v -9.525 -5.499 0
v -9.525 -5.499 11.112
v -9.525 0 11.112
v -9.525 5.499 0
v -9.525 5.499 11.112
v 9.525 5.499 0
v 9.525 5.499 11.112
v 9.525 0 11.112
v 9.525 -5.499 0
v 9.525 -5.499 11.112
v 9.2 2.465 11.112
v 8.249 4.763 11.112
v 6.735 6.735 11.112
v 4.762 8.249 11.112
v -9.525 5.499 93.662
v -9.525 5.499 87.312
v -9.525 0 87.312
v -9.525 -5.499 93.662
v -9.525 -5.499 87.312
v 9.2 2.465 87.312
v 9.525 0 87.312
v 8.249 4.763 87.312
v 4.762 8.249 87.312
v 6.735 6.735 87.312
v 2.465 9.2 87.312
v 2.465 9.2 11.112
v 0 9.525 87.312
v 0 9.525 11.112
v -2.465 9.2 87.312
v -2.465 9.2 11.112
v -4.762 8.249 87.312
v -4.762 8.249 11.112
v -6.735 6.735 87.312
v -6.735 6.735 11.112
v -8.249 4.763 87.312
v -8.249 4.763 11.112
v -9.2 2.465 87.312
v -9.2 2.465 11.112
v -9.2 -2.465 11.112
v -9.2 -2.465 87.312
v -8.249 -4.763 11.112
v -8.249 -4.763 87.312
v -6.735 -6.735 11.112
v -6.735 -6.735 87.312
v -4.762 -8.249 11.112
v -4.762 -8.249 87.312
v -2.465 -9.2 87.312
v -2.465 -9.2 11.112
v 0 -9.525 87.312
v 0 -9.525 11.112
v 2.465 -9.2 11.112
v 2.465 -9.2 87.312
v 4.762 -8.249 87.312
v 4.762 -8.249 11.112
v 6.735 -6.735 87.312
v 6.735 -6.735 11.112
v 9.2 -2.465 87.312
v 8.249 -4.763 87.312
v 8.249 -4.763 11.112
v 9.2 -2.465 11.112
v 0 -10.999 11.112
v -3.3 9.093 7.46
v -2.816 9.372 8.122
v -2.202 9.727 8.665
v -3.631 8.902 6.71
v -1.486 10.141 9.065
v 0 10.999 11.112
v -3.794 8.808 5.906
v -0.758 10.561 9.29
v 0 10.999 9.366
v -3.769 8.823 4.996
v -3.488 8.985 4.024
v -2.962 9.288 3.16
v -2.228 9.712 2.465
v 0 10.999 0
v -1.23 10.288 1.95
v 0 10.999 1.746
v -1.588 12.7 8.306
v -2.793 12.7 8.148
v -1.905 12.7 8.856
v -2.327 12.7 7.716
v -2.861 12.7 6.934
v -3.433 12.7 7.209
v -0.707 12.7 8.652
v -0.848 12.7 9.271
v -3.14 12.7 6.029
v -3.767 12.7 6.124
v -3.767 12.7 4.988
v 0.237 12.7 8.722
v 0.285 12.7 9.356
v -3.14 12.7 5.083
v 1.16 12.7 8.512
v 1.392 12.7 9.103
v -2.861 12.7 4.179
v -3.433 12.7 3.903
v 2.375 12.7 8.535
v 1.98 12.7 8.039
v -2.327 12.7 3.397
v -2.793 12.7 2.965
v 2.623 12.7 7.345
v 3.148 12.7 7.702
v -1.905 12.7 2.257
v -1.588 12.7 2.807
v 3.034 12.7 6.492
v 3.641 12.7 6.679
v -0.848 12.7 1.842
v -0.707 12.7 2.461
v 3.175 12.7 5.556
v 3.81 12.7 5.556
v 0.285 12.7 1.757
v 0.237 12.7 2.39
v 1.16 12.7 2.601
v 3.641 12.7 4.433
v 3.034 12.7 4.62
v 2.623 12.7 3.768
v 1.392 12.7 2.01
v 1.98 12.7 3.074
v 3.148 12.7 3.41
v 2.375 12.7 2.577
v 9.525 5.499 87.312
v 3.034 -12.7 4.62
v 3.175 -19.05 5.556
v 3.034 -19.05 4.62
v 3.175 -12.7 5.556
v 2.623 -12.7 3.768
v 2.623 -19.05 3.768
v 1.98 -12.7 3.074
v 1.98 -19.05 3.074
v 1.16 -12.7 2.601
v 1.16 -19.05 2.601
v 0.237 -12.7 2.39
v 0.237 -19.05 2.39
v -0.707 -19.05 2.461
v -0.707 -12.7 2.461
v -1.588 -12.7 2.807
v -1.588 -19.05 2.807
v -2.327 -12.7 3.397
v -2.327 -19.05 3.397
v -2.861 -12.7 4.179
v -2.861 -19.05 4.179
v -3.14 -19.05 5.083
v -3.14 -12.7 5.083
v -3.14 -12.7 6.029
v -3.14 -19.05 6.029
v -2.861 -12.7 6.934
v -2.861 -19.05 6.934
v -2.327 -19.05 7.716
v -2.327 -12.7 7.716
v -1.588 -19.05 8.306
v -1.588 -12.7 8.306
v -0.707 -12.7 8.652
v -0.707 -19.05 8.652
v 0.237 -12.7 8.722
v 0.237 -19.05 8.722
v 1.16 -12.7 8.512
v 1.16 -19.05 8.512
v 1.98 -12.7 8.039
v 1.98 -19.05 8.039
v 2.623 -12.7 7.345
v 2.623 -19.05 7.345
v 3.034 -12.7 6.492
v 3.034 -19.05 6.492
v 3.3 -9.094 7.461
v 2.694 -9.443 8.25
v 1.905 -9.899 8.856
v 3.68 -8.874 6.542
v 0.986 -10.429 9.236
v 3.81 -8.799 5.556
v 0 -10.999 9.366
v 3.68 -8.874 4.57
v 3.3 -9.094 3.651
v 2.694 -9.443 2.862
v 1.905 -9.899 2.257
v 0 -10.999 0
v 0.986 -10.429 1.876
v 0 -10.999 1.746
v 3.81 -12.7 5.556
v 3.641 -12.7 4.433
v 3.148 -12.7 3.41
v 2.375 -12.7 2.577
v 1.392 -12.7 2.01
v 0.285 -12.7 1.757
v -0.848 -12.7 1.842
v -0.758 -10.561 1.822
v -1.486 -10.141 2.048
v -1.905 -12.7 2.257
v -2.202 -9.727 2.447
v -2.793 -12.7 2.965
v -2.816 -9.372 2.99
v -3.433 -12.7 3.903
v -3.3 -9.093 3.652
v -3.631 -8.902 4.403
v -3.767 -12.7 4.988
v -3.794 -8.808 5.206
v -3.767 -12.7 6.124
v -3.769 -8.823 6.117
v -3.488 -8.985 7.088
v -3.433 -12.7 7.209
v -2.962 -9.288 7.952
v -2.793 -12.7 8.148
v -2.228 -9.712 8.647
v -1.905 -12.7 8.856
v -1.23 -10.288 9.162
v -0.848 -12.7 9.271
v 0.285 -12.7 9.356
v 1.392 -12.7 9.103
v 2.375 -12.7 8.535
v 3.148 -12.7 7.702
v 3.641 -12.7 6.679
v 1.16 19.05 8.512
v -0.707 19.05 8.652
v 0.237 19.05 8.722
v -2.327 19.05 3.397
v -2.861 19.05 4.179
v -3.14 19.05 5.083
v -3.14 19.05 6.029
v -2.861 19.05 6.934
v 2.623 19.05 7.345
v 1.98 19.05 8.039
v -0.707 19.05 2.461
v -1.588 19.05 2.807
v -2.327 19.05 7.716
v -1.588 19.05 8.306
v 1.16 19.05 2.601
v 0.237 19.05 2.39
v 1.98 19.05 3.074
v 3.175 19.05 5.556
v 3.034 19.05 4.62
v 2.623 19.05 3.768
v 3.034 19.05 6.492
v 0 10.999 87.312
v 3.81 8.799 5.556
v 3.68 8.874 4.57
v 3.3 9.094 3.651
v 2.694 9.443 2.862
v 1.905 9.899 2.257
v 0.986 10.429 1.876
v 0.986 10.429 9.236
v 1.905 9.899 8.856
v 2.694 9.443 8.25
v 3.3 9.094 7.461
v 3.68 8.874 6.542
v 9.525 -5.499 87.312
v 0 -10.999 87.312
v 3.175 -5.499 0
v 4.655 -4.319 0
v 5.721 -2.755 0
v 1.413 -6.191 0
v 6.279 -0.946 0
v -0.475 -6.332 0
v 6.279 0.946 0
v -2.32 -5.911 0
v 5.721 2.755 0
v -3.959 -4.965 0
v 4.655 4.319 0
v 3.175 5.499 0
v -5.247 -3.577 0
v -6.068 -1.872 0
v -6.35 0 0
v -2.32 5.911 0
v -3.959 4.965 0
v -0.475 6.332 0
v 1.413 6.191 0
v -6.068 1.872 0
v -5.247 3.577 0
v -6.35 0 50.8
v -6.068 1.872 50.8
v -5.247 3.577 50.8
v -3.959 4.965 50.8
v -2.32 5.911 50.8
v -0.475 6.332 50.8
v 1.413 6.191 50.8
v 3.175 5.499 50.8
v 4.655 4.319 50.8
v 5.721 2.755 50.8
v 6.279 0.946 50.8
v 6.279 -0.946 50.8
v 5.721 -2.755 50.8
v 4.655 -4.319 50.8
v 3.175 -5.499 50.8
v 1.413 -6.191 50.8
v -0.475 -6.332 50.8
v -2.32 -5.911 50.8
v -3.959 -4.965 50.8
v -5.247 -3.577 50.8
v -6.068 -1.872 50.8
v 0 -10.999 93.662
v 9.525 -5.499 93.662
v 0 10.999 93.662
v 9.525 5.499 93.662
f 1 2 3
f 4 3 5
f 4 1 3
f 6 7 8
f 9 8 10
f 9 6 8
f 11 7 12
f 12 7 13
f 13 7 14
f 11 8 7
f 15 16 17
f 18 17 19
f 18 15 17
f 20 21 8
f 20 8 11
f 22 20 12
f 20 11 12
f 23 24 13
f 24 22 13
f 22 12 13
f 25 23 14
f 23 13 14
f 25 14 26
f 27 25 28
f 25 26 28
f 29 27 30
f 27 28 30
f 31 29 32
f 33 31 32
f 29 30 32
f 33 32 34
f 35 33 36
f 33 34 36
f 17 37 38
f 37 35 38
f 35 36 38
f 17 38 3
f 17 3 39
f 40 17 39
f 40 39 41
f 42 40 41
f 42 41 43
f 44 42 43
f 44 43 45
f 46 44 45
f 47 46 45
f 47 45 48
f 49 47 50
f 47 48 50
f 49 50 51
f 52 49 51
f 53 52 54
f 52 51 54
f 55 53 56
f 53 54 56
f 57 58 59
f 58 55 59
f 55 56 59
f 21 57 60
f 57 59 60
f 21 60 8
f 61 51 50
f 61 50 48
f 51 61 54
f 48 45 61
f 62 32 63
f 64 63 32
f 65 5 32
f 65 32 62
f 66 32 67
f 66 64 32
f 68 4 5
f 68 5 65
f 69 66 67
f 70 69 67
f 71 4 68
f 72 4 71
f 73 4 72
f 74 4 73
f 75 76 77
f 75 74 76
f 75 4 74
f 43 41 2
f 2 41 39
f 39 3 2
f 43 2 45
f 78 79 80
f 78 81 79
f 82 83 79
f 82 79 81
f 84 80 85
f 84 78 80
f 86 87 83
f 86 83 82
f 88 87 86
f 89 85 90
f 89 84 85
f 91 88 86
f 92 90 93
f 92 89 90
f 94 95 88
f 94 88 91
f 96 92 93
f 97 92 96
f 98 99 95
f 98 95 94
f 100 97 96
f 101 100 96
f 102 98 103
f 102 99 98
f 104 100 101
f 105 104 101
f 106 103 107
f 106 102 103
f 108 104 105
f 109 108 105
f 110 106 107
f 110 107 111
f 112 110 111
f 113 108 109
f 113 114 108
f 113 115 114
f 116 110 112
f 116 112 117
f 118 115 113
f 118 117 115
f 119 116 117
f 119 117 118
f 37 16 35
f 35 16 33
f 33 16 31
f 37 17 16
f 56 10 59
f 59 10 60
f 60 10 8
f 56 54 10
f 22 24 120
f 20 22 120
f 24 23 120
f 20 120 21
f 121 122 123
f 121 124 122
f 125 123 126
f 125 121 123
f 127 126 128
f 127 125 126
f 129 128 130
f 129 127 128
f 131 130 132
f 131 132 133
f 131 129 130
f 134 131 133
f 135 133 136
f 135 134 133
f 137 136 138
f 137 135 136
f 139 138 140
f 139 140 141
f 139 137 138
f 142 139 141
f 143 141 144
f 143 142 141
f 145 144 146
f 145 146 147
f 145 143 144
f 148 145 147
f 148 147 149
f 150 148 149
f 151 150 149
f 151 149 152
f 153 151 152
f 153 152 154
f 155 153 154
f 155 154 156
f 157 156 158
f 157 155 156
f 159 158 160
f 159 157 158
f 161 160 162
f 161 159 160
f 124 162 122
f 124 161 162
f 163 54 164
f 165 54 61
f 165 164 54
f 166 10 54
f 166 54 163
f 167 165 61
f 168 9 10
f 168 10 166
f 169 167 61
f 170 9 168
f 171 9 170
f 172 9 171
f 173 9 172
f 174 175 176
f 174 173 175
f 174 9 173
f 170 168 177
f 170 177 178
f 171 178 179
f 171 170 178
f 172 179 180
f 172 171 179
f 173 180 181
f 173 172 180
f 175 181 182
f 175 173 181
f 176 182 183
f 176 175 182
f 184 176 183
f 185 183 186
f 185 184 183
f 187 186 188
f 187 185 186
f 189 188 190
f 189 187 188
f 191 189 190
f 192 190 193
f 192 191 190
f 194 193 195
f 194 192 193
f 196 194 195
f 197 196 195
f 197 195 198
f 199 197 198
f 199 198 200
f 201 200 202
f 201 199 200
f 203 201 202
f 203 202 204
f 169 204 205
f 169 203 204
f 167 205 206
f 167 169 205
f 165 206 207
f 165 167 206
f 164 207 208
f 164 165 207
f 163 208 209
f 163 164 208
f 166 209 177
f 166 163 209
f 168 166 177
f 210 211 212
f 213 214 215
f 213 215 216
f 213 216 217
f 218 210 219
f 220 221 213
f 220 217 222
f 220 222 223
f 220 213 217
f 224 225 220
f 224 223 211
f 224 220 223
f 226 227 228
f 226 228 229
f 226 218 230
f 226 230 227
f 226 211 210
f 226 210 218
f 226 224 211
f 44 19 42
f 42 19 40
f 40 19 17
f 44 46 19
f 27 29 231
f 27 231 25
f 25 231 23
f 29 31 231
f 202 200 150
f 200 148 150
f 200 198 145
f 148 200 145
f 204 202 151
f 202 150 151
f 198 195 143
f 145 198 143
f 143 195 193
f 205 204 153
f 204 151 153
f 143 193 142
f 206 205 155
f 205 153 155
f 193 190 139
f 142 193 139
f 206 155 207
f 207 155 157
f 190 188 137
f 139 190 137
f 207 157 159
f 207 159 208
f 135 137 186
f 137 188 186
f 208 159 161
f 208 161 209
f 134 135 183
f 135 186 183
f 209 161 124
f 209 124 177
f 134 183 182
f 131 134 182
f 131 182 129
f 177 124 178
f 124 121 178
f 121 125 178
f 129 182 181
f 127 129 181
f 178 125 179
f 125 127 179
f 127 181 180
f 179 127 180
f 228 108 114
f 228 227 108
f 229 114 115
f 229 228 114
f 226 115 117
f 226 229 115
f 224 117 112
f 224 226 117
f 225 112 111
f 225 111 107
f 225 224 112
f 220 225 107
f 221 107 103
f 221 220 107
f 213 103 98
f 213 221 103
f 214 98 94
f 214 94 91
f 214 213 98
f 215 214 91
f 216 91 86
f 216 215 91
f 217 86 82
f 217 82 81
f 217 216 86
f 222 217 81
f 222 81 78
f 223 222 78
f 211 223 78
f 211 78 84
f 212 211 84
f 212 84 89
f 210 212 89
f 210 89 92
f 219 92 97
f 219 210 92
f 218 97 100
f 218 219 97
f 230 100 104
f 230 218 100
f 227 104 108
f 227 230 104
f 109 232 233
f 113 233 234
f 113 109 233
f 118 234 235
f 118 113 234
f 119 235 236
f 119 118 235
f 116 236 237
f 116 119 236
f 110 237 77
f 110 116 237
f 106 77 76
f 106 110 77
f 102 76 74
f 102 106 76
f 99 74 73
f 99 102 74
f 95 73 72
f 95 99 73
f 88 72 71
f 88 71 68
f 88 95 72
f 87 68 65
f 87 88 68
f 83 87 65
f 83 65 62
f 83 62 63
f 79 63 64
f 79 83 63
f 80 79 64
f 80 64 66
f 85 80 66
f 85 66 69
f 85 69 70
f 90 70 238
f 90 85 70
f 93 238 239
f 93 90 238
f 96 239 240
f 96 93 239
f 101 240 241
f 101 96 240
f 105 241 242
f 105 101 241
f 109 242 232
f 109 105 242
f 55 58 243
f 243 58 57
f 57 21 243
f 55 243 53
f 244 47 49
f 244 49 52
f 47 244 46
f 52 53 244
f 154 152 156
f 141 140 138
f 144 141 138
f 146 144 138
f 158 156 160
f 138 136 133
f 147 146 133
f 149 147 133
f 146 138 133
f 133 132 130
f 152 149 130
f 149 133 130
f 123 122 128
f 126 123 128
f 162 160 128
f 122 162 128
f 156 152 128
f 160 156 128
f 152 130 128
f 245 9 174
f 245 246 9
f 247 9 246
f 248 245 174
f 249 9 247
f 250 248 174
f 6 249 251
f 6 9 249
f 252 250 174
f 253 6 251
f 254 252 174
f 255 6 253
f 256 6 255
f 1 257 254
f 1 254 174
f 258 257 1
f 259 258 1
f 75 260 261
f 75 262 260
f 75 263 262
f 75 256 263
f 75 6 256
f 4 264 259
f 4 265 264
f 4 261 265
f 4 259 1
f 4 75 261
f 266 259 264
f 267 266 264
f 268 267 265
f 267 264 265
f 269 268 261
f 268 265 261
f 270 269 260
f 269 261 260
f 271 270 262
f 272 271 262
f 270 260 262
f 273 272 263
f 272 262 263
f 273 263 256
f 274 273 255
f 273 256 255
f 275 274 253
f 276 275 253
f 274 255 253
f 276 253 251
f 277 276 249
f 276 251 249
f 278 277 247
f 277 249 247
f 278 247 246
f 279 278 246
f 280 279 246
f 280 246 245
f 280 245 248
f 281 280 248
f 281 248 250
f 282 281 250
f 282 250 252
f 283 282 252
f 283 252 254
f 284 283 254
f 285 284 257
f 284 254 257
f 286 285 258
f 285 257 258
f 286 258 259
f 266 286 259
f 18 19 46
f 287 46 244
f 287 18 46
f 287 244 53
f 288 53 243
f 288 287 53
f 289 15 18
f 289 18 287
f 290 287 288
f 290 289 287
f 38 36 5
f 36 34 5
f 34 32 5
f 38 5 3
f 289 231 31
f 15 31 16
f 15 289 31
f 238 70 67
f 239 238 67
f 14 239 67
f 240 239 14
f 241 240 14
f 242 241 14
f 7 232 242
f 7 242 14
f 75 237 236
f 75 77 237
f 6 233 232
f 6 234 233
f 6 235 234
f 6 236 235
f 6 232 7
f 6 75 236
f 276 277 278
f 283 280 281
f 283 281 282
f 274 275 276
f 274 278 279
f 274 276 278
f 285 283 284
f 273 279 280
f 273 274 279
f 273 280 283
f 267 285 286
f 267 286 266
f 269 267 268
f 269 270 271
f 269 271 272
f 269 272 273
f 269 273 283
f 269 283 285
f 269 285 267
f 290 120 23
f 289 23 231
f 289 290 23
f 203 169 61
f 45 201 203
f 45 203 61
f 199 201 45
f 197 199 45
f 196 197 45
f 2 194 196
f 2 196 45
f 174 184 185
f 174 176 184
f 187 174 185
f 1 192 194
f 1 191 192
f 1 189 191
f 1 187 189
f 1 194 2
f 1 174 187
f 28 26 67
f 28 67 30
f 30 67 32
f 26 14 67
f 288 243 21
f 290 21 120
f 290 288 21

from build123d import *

# Parameters (mm, degrees)
SKETCH6_R           = 9.525
BOSS_EXTRUDE5_DEPTH = 93.6625
BOSS_EXTRUDE6_DEPTH = 6.35
BOSS_EXTRUDE7_DEPTH = 11.1125
SKETCH9_R           = 3.175
BOSS_EXTRUDE8_DEPTH = 19.05
SKETCH11_R          = 3.81
BOSS_EXTRUDE9_DEPTH = 12.7
SKETCH12_R          = 6.35
CUT_EXTRUDE2_DEPTH  = 50.8


with BuildPart() as part:
    # Sketch6 → Boss-Extrude5 (new body)
    with BuildSketch(Plane.XY):
        Circle(SKETCH6_R)
    extrude(amount=BOSS_EXTRUDE5_DEPTH)

    # Sketch7 → Boss-Extrude6 (add)
    with BuildSketch(Plane.XY.offset(93.6625)):
        Polygon((0, 10.998522628), (-9.525, 5.499261314), (-9.525, -5.499261314), (0, -10.998522628), (9.525, -5.499261314), (9.525, 5.499261314), align=None)
    extrude(amount=-BOSS_EXTRUDE6_DEPTH)

    # Sketch8 → Boss-Extrude7 (add)
    with BuildSketch(Plane(origin=(0, 0, 0), x_dir=(-1, 0, 0), z_dir=(0, 0, -1))):
        Polygon((0, 10.998522628), (-9.525, 5.499261314), (-9.525, -5.499261314), (0, -10.998522628), (9.525, -5.499261314), (9.525, 5.499261314), align=None)
    extrude(amount=-BOSS_EXTRUDE7_DEPTH)

    # Sketch9 → Boss-Extrude8 (add, symmetric)
    with BuildSketch(Plane(origin=(0, 0, 0), x_dir=(1, 0, 0), z_dir=(0, 1, 0))):
        with Locations((0, -5.55625)):
            Circle(SKETCH9_R)
    extrude(amount=BOSS_EXTRUDE8_DEPTH, both=True)

    # Sketch11 → Boss-Extrude9 (add, symmetric)
    with BuildSketch(Plane(origin=(0, 0, 0), x_dir=(1, 0, 0), z_dir=(0, 1, 0))):
        with Locations((0, -5.55625)):
            Circle(SKETCH11_R)
    extrude(amount=BOSS_EXTRUDE9_DEPTH, both=True)

    # Sketch12 → Cut-Extrude2 (cut)
    with BuildSketch(Plane(origin=(0, 0, 0), x_dir=(-1, 0, 0), z_dir=(0, 0, -1))):
        Circle(SKETCH12_R)
    extrude(amount=-CUT_EXTRUDE2_DEPTH, mode=Mode.SUBTRACT)


solid = part.part
